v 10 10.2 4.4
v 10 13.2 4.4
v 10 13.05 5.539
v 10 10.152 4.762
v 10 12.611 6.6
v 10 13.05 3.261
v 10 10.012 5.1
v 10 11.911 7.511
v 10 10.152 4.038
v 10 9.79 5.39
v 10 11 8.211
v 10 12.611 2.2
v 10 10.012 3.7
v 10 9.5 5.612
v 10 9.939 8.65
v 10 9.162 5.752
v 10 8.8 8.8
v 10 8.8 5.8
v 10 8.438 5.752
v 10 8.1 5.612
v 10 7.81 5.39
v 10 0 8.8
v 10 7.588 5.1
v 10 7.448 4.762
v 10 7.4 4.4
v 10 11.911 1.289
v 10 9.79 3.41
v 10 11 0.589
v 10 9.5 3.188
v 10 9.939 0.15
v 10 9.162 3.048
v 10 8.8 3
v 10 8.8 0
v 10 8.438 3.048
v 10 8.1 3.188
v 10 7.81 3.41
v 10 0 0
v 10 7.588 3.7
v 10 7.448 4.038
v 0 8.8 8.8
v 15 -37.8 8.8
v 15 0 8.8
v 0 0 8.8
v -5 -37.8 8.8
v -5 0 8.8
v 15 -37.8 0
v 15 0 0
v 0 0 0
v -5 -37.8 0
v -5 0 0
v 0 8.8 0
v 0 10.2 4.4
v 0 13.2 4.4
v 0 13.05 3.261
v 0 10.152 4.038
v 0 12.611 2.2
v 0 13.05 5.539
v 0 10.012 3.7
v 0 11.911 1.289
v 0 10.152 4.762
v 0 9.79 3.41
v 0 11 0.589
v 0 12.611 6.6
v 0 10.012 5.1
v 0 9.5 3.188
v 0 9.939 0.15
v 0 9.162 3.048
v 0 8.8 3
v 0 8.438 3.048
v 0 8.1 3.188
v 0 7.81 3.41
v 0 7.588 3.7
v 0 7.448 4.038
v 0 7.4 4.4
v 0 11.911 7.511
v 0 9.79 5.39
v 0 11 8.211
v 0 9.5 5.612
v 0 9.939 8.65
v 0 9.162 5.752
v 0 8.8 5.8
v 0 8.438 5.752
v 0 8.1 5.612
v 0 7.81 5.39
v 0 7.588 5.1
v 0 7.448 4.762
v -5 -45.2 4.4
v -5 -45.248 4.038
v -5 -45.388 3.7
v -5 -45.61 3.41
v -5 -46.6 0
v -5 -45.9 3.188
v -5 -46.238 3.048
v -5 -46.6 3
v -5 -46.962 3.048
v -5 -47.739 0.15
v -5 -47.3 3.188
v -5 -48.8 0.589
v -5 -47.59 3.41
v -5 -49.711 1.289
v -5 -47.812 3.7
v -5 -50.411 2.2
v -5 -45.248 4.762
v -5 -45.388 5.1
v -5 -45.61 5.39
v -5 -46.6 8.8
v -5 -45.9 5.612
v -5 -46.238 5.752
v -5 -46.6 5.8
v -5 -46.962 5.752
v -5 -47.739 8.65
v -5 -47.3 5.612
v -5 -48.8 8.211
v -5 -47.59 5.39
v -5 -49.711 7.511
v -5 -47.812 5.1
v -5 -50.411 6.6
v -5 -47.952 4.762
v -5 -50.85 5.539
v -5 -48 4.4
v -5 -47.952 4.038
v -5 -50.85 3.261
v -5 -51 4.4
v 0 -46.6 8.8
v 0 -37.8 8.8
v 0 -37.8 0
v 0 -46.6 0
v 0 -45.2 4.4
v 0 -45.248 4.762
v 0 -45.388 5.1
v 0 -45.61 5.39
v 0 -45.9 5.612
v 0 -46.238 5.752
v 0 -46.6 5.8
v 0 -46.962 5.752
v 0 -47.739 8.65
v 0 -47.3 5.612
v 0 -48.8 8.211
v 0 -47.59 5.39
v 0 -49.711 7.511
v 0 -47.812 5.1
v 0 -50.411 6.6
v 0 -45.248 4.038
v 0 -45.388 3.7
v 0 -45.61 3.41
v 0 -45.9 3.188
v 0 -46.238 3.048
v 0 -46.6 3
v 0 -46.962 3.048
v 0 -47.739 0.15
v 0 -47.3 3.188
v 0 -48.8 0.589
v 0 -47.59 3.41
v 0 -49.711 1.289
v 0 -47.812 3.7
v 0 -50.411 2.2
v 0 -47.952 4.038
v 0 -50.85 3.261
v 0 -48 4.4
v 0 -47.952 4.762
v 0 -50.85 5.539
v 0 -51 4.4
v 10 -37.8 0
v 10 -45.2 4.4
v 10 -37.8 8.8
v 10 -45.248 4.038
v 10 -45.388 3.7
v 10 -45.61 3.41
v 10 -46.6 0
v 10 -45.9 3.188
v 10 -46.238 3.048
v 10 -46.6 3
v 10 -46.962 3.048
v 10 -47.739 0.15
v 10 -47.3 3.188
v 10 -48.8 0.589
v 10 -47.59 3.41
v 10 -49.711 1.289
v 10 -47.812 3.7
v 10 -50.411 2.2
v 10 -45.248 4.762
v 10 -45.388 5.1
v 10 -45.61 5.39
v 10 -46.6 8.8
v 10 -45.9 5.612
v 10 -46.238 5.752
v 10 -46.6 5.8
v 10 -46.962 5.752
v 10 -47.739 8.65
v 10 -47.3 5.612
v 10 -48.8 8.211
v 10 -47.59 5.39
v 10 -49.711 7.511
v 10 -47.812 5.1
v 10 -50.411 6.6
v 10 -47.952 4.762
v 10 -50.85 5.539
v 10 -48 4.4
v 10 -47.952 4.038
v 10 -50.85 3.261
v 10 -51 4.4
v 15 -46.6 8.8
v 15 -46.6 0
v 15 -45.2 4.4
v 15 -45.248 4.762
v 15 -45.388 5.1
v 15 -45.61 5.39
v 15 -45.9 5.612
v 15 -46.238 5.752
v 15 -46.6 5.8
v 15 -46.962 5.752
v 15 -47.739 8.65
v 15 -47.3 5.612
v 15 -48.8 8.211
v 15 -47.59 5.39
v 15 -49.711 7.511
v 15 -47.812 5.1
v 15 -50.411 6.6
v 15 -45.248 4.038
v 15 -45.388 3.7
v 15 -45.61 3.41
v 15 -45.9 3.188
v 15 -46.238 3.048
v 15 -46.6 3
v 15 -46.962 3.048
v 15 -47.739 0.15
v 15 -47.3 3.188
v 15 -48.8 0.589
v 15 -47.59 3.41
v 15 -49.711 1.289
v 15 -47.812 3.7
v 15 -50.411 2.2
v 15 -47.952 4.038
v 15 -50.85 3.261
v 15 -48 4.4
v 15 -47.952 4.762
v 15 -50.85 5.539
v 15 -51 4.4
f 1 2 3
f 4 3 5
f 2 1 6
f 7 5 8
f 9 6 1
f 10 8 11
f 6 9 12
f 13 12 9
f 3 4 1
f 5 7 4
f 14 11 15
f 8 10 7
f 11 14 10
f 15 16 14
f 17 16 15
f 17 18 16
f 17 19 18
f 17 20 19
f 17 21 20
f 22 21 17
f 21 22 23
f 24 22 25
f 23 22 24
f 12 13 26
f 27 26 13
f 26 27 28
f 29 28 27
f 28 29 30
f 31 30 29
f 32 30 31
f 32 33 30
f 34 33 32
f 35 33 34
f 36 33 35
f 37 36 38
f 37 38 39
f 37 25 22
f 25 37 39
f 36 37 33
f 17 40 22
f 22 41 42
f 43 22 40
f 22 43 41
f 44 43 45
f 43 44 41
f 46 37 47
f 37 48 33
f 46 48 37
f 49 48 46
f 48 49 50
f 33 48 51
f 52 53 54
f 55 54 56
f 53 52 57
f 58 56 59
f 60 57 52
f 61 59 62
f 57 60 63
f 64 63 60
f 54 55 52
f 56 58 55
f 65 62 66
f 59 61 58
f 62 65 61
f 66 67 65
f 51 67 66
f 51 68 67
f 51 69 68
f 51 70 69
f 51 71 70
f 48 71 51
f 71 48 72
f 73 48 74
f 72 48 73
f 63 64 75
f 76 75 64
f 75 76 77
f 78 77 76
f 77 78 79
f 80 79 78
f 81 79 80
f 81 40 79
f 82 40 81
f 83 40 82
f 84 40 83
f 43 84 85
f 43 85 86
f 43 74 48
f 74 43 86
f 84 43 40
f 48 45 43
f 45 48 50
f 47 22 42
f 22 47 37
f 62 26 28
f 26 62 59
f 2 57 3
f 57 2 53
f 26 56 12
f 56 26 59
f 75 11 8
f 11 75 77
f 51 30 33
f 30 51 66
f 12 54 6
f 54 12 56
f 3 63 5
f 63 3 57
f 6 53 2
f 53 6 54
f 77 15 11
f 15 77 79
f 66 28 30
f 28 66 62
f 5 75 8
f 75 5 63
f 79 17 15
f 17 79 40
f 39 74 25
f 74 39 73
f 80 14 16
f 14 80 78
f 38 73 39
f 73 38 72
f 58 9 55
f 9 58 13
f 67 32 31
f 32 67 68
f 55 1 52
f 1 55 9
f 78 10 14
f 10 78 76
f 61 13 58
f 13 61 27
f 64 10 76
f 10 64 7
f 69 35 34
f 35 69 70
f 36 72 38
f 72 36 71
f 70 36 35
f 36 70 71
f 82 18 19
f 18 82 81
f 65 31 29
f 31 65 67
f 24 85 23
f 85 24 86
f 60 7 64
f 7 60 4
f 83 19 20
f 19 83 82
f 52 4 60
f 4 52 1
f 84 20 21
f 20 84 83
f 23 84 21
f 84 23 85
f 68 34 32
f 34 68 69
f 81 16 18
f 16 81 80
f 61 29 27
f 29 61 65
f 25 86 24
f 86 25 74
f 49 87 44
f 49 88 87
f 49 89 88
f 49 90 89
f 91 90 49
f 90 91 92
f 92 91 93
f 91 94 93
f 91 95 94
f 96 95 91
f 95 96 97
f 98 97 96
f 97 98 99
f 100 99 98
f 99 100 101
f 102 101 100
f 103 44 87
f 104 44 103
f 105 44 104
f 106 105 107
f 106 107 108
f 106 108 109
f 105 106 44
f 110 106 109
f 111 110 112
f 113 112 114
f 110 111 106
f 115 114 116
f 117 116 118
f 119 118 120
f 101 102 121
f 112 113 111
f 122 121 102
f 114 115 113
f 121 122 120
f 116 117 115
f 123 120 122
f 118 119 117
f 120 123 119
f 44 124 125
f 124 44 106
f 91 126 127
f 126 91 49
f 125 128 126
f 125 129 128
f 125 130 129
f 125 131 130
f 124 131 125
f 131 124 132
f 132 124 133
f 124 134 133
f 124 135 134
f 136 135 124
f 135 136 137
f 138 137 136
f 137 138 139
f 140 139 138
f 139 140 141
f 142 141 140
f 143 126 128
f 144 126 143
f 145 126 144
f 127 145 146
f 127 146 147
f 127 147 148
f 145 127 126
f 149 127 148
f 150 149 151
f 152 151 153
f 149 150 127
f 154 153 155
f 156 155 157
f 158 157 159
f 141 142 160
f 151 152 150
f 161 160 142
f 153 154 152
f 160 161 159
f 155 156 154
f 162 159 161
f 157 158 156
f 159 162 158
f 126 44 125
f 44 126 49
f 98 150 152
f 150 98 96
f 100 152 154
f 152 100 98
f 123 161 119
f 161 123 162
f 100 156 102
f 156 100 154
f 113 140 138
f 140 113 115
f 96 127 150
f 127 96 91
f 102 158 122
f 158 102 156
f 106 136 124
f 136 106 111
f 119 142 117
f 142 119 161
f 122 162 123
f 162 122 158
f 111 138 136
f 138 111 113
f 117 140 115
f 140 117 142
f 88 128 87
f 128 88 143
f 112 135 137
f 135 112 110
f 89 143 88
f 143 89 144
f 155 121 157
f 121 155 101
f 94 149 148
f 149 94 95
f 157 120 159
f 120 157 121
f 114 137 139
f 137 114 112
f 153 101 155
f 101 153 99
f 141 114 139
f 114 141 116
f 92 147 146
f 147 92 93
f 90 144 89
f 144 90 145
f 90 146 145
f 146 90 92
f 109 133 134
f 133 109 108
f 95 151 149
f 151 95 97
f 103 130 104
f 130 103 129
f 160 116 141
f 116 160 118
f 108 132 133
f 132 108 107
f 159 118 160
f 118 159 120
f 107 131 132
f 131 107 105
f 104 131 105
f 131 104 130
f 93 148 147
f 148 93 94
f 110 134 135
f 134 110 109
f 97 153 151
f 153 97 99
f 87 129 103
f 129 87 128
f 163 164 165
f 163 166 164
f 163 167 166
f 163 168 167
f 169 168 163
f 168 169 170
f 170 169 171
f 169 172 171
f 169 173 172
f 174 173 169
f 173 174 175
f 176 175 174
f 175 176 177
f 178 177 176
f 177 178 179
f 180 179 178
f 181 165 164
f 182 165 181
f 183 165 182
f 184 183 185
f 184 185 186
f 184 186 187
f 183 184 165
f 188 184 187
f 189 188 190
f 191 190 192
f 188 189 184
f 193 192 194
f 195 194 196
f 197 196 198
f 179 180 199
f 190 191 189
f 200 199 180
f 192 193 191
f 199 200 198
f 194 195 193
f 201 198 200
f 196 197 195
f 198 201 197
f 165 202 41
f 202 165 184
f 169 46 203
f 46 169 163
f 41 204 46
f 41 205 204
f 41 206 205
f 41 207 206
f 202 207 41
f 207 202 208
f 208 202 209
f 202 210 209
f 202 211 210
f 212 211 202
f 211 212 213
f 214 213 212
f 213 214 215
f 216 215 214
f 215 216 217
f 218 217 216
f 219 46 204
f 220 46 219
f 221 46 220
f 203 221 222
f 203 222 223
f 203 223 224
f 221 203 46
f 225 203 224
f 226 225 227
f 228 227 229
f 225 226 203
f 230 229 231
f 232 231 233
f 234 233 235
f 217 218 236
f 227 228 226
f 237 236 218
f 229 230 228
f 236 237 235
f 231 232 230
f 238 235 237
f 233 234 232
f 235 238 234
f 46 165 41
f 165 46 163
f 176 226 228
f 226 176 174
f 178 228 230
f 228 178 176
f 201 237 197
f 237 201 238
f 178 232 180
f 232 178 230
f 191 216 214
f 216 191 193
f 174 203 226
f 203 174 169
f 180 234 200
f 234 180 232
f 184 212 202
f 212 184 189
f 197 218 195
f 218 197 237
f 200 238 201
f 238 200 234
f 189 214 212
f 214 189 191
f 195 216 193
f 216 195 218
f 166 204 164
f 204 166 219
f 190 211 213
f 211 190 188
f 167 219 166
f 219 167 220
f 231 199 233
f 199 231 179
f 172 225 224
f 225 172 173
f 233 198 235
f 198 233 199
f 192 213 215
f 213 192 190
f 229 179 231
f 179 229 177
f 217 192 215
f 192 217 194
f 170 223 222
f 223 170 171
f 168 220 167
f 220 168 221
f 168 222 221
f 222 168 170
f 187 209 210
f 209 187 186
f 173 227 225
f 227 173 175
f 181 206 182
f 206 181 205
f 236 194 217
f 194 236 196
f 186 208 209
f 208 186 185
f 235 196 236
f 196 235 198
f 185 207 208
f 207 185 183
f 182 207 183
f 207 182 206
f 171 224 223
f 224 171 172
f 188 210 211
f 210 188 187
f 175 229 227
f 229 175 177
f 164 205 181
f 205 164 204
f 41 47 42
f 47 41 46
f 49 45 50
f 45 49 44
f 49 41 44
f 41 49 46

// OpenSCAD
// file: common_vars.scad
// General parameters
wall_thickness = 3.0;
extra_space = 0.5;

// Board dimensions
board_thickness = 1.3;
board_size = 37.8;
board_hole_diameter = 2.0;
board_hole_center_distance_from_board_edge = 1.8;
board_elements_height = 2.0;

// Lens dimensions
lens_box_distance_from_board_edge = 11.0;
lens_box_size = 15.8;
lens_screw_head_diameter = 3.2;
lens_screw_offset = 9.3;
box_eyelet_size = 4;
box_eyelet_thickness = 3.2;

// Screw dimensions
screw_diameter = 1.5;
screw_depth = 9.0;
screw_wall_thickness = board_hole_center_distance_from_board_edge - screw_diameter / 2;
screw_well_x_offset = board_size / 2 - board_hole_center_distance_from_board_edge;
screw_well_z_offset = board_size / 2 - board_hole_center_distance_from_board_edge;

// Wire parameters
wire_diameter = 6.3;
wire_length = 35.0;
socket_width = 10.8;
socket_height = 10.8;

// Bolt parameters
nut_diameter = 6.2;
nut_height = 2.4;
bolt_diameter = 2.8;
bolt_well_wall_thickness = 1.0;
bolt_well_diameter_wide = nut_diameter / cos(180 / 6) + bolt_well_wall_thickness * 2;
bolt_well_diameter_narrow = bolt_diameter + bolt_well_wall_thickness * 2;
bolt_well_height = screw_depth + board_thickness + board_elements_height;
bolt_well_x_offset = board_size / 2 + extra_space + bolt_well_diameter_wide / 2;
bolt_well_y_offset = board_thickness + board_elements_height;
bolt_well_z_offset = board_size / 2 - bolt_well_diameter_wide / 2 + extra_space;
bolt_hole_y_offset = -bolt_well_height;

// Tail dimension
tail_x_dim = socket_width + wall_thickness * 2;
tail_y_dim = wire_length + wall_thickness;
tail_z_dim = socket_height + wall_thickness + extra_space;

// Hinge
hinge_length = 10.0;
hinge_diameter = bolt_diameter + 2 * wall_thickness;

// Stand
stand_length = board_size;

// T-Nut parameters
t_nut_well_diameter = 7.3;
t_nut_height = 8.8;
t_nut_cap_thicklness = 1.4;
t_nut_cap_diameter = 18.0;
t_nut_spike_length = 7.4;
t_nut_spike_width = 2.6;

module nut_trap() {
    cylinder(d = nut_diameter / cos(180 / 6) + 0.2, h = nut_height + 0.2, $fn = 6);
}

module bolt_well(vertical, height) {
    angle = vertical ? 180 : 90;
    rotate(a=[angle, 0, 0])
        cylinder($fn = 24, d1 = bolt_well_diameter_narrow, d2 = bolt_well_diameter_wide, h = height);
}

module bolt_hole(vertical) {
    angle = vertical ? 0 : 270;
    rotate(a=[angle, 0, 0]) union() {
        nut_trap();
        cylinder($fn = 24, h = 100, d = bolt_diameter);
    }
}

module tail() {
    difference() {
        union() {
            cube(size = [tail_x_dim, tail_y_dim, tail_z_dim]);
            translate([tail_x_dim, tail_y_dim / 3, tail_z_dim]) bolt_well(true, tail_z_dim);
            translate([0, tail_y_dim / 3 * 2, tail_z_dim]) bolt_well(true, tail_z_dim);
        }
        translate([tail_x_dim, tail_y_dim / 3, 0]) bolt_hole(true);
        translate([0, tail_y_dim / 3 * 2, 0]) bolt_hole(true);
        translate([socket_width / 2 + wall_thickness, 50, socket_height / 2]) rotate(a=[90, 0, 0]) cylinder($fn = 24, d = wire_diameter, h = 100);
    }
}

module socket_cutout() {
    cube(size = [socket_width, tail_y_dim, socket_height + extra_space], center=true);
}

module horizontal_wall() {
    translate([0, bolt_well_height / 2 + wall_thickness, wall_thickness / 2]) cube(size = [board_size + extra_space * 2 + bolt_well_diameter_wide * 2 + wall_thickness * 2, wall_thickness + bolt_well_height + wall_thickness, wall_thickness], center=true);
}

module side_wall() {
    translate([0, -wall_thickness - bolt_well_height, -board_size / 2 - extra_space - wall_thickness]) cube(size = [wall_thickness, wall_thickness + bolt_well_height + wall_thickness, board_size + extra_space * 2 + wall_thickness * 2]);
}

module hinge_block(cylinder_length) {
    difference() {
        union() {
            cube(size = [cylinder_length, hinge_diameter, hinge_diameter]);
            translate([0, hinge_diameter, hinge_diameter / 2]) rotate(a = [0, 90, 0]) cylinder($fn = 24, d = hinge_diameter, h = cylinder_length);
        }
        translate([0, hinge_diameter, hinge_diameter / 2]) rotate(a = [0, 90, 0]) cylinder($fn = 24, d = bolt_diameter, h = cylinder_length);
    }
}
// main file
include <common_vars.scad>

hinge_block(hinge_length);
translate([-hinge_length / 2, -stand_length, 0]) cube(size = [hinge_length * 2, stand_length, hinge_diameter]);
translate([0, -stand_length, 0]) rotate(a = [0, 0, 180]) hinge_block(hinge_length / 2);
translate([hinge_length * 3 / 2, -stand_length, 0]) rotate(a = [0, 0, 180]) hinge_block(hinge_length / 2);
